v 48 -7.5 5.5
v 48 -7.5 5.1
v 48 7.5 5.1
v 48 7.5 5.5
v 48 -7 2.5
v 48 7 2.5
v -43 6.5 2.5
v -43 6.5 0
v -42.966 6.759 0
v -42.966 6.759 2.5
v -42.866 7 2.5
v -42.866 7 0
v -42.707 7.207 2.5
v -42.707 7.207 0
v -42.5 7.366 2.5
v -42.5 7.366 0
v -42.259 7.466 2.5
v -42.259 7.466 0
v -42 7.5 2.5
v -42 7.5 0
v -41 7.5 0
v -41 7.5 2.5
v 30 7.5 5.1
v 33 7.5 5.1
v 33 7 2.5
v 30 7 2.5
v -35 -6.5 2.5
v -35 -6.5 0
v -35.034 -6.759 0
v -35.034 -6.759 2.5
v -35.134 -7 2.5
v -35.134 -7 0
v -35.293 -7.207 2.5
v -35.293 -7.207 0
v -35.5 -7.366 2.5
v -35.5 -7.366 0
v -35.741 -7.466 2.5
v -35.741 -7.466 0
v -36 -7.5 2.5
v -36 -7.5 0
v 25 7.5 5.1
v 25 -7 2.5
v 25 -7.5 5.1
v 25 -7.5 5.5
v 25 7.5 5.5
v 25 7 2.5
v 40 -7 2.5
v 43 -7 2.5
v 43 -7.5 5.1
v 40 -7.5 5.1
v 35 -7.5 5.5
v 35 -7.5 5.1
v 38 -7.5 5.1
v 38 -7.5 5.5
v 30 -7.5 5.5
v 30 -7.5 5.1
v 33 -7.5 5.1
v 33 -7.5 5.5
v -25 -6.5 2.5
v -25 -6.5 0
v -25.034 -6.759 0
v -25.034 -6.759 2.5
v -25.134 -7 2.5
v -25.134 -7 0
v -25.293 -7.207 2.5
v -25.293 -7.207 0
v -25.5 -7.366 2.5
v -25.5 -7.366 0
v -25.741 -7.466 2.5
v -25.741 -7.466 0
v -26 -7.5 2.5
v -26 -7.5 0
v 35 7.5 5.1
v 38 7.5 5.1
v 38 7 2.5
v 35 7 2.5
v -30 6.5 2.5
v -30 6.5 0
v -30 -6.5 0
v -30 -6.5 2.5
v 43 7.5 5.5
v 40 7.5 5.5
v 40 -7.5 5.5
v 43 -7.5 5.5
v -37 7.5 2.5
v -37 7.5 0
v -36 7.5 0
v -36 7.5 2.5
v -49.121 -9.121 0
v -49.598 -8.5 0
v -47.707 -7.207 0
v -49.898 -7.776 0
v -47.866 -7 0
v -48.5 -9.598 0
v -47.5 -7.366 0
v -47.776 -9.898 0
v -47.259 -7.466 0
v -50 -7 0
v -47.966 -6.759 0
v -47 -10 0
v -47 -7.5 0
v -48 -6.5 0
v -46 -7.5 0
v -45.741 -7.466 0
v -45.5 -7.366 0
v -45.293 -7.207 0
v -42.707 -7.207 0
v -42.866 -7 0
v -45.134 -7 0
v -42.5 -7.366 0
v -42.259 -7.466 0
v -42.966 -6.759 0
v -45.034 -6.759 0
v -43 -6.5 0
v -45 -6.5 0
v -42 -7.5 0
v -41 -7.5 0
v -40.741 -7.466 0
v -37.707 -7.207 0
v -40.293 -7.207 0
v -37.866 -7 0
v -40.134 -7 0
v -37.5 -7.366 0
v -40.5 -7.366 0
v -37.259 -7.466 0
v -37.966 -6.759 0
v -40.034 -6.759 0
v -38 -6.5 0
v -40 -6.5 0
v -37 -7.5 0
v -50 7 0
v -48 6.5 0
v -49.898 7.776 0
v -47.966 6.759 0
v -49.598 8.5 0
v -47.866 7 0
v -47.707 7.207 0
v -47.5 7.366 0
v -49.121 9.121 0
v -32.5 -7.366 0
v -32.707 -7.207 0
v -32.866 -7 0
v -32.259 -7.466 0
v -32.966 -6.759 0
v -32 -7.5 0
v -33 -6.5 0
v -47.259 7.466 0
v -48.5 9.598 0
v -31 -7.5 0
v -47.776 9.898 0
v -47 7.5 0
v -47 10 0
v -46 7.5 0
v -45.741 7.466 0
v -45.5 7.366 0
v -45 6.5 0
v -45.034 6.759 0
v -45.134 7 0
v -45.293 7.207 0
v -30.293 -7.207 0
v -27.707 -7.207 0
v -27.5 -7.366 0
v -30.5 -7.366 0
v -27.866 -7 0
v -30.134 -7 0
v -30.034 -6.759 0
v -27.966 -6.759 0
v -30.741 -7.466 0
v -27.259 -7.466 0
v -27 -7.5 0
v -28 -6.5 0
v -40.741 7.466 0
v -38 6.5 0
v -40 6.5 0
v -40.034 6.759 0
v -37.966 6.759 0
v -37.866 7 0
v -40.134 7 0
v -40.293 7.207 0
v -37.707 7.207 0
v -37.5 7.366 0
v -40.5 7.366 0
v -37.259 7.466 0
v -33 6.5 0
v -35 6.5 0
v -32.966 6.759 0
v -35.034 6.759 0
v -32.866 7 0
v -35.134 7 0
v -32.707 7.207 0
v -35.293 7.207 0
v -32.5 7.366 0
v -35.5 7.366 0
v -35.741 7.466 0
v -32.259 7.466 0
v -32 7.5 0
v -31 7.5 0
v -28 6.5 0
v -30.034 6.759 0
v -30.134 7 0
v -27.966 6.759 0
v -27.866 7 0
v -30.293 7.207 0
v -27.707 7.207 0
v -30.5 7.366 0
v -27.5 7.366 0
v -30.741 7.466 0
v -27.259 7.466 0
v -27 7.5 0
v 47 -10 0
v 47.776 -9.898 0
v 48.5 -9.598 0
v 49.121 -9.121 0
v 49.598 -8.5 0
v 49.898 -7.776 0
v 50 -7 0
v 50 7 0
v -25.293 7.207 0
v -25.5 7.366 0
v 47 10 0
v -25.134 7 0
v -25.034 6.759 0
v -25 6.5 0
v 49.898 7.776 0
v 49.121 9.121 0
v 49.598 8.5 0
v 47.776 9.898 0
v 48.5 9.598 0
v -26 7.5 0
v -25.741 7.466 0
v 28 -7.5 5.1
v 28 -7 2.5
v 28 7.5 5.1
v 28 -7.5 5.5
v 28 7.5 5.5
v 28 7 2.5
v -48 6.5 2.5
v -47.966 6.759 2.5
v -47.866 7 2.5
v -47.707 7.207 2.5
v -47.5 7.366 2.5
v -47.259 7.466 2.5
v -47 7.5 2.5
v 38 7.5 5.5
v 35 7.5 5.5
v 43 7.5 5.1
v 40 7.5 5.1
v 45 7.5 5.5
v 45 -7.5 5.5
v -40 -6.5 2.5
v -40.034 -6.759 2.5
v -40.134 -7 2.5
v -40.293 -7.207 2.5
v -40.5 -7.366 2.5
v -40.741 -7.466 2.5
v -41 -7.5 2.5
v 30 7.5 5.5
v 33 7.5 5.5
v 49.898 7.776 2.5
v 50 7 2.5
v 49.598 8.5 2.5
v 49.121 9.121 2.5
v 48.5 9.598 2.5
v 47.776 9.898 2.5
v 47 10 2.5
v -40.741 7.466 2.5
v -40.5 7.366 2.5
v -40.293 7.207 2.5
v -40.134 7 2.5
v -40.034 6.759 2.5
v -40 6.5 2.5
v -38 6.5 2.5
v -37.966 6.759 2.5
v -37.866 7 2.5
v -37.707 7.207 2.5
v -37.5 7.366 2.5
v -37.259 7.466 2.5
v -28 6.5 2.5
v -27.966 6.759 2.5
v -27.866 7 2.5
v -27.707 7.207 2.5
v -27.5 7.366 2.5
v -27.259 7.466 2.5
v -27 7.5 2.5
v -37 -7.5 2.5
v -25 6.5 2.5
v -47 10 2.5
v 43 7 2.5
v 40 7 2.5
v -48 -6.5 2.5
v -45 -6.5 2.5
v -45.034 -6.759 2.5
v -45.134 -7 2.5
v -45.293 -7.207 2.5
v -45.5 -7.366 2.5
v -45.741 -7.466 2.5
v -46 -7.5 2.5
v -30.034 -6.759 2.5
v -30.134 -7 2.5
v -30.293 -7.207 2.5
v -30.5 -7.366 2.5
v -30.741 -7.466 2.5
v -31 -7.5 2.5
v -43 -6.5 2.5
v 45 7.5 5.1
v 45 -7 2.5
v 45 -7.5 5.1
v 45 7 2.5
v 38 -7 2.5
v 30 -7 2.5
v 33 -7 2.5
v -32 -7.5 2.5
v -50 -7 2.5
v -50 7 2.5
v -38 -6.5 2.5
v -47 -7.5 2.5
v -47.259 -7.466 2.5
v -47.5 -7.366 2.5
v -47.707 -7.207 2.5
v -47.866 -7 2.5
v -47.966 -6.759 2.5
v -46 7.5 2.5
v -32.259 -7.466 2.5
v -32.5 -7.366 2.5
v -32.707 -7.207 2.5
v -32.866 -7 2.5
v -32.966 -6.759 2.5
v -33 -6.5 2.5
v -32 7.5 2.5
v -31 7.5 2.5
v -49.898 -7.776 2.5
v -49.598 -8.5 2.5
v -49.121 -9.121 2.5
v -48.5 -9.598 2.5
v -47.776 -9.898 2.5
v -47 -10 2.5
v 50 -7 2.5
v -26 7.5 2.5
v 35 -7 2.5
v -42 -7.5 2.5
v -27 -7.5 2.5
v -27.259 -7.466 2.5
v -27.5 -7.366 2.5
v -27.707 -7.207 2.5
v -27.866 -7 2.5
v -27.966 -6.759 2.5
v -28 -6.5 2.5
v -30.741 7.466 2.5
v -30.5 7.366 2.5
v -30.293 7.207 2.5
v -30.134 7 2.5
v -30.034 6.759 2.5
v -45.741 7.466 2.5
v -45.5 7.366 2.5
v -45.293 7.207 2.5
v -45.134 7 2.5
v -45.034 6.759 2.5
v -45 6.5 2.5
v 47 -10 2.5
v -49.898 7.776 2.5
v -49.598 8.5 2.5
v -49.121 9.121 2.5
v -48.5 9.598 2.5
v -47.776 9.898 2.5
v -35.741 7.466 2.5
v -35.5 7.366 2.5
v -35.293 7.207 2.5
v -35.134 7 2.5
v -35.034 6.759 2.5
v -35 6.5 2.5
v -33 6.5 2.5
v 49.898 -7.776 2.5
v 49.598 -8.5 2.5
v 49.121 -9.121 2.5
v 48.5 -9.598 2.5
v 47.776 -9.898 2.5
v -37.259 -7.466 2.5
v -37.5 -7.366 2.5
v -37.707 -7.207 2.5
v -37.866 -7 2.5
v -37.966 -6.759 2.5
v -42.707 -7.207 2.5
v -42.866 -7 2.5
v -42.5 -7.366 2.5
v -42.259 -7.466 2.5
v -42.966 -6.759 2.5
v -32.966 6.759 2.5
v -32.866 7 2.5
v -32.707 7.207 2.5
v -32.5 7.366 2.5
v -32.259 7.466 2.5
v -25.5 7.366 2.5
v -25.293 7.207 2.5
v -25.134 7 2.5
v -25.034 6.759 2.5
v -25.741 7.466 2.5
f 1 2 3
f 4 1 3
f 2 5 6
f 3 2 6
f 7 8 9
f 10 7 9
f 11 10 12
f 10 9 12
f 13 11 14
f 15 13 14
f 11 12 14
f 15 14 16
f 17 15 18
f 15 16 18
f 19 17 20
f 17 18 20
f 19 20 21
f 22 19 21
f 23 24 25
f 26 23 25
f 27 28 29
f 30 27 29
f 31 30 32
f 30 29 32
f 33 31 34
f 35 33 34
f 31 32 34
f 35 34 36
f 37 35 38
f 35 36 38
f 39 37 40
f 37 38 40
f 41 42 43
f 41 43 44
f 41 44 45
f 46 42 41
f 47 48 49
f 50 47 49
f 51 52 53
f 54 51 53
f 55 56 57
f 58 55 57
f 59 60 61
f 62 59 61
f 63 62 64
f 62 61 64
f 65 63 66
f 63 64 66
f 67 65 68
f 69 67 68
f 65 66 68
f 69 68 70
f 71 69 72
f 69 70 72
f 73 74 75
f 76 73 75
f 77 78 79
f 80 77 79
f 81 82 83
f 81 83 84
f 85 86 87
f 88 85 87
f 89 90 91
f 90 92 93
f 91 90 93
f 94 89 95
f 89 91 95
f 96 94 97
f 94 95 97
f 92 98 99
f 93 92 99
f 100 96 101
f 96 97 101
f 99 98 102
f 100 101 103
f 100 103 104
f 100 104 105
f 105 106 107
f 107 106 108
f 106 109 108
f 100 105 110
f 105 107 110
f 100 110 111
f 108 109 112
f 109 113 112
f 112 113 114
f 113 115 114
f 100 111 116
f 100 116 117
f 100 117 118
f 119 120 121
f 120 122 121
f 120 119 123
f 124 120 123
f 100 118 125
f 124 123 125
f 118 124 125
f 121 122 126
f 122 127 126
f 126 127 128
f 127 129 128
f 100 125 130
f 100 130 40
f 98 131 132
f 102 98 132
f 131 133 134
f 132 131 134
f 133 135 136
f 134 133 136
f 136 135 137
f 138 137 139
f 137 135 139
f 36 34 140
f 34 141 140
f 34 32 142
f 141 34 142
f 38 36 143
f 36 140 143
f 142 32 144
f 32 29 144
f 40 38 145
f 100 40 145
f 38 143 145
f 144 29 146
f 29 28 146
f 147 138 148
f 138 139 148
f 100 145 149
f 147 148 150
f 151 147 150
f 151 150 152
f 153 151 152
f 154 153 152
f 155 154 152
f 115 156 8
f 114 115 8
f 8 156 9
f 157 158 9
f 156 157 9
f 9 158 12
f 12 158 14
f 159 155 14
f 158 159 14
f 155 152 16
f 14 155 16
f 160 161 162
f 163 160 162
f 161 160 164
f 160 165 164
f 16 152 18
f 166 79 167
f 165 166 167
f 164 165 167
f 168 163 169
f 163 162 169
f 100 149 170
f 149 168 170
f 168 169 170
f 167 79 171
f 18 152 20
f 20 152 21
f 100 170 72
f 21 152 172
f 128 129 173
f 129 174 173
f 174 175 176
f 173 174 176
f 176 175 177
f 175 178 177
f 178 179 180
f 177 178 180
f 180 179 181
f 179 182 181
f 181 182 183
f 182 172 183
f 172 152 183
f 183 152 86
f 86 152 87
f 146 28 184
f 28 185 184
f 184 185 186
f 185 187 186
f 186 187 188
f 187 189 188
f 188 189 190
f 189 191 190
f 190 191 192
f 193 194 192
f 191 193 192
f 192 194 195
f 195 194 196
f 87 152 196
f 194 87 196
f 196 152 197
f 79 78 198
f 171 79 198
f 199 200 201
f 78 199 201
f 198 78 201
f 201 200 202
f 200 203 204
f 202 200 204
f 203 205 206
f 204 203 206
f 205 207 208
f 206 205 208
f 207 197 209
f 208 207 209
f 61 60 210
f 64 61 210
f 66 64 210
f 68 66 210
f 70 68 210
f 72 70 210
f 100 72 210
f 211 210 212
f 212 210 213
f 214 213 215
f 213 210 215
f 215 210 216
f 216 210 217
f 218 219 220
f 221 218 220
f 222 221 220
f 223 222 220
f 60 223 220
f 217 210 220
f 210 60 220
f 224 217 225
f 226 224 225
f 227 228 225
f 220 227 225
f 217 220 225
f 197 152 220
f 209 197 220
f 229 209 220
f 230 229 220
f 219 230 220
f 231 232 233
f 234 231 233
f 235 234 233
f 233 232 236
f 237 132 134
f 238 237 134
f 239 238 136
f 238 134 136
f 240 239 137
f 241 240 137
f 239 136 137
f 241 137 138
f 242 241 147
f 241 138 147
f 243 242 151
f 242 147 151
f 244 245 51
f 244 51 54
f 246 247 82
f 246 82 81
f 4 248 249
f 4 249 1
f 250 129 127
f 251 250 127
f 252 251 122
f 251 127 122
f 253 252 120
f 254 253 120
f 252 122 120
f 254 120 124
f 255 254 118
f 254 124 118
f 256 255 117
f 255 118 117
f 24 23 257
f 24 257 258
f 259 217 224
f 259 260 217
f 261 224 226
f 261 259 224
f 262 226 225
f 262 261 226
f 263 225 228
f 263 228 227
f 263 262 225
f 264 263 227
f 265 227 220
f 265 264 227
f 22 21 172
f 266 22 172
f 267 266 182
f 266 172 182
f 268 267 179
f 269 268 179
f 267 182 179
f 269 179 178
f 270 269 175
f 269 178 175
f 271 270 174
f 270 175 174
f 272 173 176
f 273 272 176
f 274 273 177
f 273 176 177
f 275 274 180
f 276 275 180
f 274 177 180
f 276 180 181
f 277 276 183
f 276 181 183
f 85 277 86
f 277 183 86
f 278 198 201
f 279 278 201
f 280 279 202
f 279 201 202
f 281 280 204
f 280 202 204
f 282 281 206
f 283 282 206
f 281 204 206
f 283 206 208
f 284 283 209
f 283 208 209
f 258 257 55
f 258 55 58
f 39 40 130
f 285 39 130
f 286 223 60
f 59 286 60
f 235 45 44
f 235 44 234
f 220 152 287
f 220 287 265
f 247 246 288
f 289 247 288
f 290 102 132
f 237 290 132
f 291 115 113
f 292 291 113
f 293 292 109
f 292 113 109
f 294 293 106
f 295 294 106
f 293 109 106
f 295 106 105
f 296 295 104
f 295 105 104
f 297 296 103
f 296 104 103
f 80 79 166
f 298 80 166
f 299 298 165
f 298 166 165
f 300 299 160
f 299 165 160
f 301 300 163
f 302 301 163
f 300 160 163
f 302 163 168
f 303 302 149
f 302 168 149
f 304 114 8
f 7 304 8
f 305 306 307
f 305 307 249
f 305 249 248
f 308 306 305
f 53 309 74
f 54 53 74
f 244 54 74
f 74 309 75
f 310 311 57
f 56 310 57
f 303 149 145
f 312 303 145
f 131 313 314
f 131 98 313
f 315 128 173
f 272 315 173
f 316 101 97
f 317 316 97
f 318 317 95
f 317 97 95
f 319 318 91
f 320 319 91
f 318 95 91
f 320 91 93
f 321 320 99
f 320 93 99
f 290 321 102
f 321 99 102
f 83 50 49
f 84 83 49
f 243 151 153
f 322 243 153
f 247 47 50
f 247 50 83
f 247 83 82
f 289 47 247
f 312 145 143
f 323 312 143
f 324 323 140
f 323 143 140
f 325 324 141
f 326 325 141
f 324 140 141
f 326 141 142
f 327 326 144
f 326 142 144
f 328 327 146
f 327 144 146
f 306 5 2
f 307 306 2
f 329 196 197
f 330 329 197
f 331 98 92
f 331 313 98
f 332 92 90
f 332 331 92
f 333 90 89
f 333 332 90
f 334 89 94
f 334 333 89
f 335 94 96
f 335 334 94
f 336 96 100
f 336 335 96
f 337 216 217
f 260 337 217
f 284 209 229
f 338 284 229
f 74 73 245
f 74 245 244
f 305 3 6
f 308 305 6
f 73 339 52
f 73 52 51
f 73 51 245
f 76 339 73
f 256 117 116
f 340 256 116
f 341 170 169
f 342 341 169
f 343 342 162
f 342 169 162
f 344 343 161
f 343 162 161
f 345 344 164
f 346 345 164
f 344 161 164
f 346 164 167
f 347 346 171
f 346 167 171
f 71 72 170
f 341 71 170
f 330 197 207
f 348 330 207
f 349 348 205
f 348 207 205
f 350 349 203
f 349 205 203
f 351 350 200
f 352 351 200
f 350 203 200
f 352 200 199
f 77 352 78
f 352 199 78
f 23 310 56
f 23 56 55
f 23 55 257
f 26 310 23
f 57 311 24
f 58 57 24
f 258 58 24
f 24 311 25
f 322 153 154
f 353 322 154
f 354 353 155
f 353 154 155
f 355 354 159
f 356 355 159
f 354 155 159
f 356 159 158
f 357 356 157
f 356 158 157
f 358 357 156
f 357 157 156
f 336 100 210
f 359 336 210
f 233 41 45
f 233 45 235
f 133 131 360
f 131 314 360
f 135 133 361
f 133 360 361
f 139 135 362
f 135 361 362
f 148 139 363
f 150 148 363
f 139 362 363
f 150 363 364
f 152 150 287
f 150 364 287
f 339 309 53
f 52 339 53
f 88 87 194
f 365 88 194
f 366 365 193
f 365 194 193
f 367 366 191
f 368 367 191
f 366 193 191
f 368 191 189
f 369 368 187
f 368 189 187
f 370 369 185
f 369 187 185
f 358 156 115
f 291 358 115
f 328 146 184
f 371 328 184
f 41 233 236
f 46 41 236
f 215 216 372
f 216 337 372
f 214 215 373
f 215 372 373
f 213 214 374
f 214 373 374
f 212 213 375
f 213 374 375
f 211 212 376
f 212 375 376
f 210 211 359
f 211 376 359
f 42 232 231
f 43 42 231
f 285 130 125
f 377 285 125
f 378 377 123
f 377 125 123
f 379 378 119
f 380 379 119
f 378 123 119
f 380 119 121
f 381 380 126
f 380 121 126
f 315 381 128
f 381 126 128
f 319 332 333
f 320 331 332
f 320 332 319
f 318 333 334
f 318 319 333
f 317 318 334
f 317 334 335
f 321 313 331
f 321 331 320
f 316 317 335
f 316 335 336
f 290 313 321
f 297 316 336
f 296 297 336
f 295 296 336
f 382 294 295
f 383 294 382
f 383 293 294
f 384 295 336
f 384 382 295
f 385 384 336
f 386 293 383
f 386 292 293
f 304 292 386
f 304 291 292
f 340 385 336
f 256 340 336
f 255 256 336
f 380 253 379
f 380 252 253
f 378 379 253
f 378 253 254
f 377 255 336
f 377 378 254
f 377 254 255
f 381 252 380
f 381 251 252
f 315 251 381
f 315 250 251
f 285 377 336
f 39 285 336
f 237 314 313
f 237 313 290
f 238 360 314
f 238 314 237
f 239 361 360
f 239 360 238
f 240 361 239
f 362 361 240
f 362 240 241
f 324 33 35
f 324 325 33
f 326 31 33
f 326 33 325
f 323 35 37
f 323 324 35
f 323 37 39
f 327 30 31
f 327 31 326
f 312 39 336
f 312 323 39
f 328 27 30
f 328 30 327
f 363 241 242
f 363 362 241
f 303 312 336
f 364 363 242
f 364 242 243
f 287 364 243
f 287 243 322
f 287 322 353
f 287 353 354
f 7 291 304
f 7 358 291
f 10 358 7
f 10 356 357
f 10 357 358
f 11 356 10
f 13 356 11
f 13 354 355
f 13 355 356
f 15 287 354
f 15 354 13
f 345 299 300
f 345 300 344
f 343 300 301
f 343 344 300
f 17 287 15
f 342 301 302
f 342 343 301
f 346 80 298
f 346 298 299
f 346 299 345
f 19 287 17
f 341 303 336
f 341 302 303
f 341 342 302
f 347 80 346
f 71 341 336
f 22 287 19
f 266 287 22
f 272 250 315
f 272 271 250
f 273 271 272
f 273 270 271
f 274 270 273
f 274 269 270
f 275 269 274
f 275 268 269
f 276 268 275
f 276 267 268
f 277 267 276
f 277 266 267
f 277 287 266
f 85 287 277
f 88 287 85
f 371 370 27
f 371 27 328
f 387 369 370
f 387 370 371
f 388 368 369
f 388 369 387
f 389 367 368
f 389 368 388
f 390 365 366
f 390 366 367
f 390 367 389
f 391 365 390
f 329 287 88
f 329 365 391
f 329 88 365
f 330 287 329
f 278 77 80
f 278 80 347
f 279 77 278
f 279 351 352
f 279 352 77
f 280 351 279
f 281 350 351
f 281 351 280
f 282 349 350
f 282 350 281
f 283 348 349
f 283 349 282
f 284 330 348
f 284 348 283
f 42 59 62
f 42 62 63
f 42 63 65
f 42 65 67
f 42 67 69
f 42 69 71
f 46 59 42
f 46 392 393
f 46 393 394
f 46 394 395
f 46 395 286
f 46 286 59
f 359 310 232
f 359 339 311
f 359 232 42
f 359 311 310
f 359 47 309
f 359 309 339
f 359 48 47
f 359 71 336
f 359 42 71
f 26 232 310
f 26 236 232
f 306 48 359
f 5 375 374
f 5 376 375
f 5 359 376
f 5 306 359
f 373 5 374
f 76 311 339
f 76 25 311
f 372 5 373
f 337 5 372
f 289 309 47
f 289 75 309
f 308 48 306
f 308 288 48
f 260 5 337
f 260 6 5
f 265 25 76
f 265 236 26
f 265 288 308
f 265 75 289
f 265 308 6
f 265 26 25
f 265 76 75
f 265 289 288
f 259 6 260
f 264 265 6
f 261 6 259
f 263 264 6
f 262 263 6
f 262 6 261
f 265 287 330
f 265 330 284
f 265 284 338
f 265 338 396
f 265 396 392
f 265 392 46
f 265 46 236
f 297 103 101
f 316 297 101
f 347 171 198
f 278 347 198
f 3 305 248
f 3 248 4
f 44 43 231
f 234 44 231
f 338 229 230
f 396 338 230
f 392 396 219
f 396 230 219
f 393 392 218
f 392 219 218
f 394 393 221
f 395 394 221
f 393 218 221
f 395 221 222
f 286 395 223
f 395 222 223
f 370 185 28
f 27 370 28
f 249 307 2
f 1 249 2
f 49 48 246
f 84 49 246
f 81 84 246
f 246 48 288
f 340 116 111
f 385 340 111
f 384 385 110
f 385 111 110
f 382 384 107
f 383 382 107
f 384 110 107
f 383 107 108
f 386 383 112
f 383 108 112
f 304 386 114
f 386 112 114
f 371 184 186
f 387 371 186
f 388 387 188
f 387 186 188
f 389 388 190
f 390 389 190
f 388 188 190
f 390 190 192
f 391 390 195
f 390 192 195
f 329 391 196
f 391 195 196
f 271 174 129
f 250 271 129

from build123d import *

# Parameters (mm, degrees)
F0_W     = 100
F0_H     = 20
F0_W_2   = 3
F0_H_2   = 15
F1_DEPTH = 2.5
F2_W     = 3
F2_H     = 15
F3_DEPTH = 3
F5_DEPTH = 98.001
F6_R     = 3


# Not quite as in the source:
# - a feature names something its author has since deleted; it is built from what else it names


with BuildPart() as f1:
    # F0 (on Top) → F1 (new body)
    with BuildSketch(Plane.XY):
        Rectangle(F0_W, F0_H)
        with BuildLine():
            ThreePointArc((-45, -6.5), (-45.2928932188, -7.2071067812), (-46, -7.5))
            Line((-46, -7.5), (-47, -7.5))
            ThreePointArc((-47, -7.5), (-47.7071067812, -7.2071067812), (-48, -6.5))
            Line((-48, -6.5), (-48, 6.5))
            ThreePointArc((-48, 6.5), (-47.7071067812, 7.2071067812), (-47, 7.5))
            Line((-47, 7.5), (-46, 7.5))
            ThreePointArc((-46, 7.5), (-45.2928932188, 7.2071067812), (-45, 6.5))
            Line((-45, 6.5), (-45, -6.5))
        make_face(mode=Mode.SUBTRACT)
        with BuildLine():
            Line((-42, 7.5), (-41, 7.5))
            ThreePointArc((-41, 7.5), (-40.2928932188, 7.2071067812), (-40, 6.5))
            Line((-40, 6.5), (-40, -6.5))
            ThreePointArc((-40, -6.5), (-40.2928932188, -7.2071067812), (-41, -7.5))
            Line((-41, -7.5), (-42, -7.5))
            ThreePointArc((-42, -7.5), (-42.7071067812, -7.2071067812), (-43, -6.5))
            Line((-43, -6.5), (-43, 6.5))
            ThreePointArc((-43, 6.5), (-42.7071067812, 7.2071067812), (-42, 7.5))
        make_face(mode=Mode.SUBTRACT)
        with BuildLine():
            Line((-37, 7.5), (-36, 7.5))
            ThreePointArc((-36, 7.5), (-35.2928932188, 7.2071067812), (-35, 6.5))
            Line((-35, 6.5), (-35, -6.5))
            ThreePointArc((-35, -6.5), (-35.2928932188, -7.2071067812), (-36, -7.5))
            Line((-36, -7.5), (-37, -7.5))
            ThreePointArc((-37, -7.5), (-37.7071067812, -7.2071067812), (-38, -6.5))
            Line((-38, -6.5), (-38, 6.5))
            ThreePointArc((-38, 6.5), (-37.7071067812, 7.2071067812), (-37, 7.5))
        make_face(mode=Mode.SUBTRACT)
        with BuildLine():
            Line((-32, 7.5), (-31, 7.5))
            ThreePointArc((-31, 7.5), (-30.2928932188, 7.2071067812), (-30, 6.5))
            Line((-30, 6.5), (-30, -6.5))
            ThreePointArc((-30, -6.5), (-30.2928932188, -7.2071067812), (-31, -7.5))
            Line((-31, -7.5), (-32, -7.5))
            ThreePointArc((-32, -7.5), (-32.7071067812, -7.2071067812), (-33, -6.5))
            Line((-33, -6.5), (-33, 6.5))
            ThreePointArc((-33, 6.5), (-32.7071067812, 7.2071067812), (-32, 7.5))
        make_face(mode=Mode.SUBTRACT)
        with BuildLine():
            Line((-27, 7.5), (-26, 7.5))
            ThreePointArc((-26, 7.5), (-25.2928932188, 7.2071067812), (-25, 6.5))
            Line((-25, 6.5), (-25, -6.5))
            ThreePointArc((-25, -6.5), (-25.2928932188, -7.2071067812), (-26, -7.5))
            Line((-26, -7.5), (-27, -7.5))
            ThreePointArc((-27, -7.5), (-27.7071067812, -7.2071067812), (-28, -6.5))
            Line((-28, -6.5), (-28, 6.5))
            ThreePointArc((-28, 6.5), (-27.7071067812, 7.2071067812), (-27, 7.5))
        make_face(mode=Mode.SUBTRACT)
        with Locations((26.5, 0)):
            Rectangle(F0_W_2, F0_H_2, mode=Mode.SUBTRACT)
        with Locations((31.5, 0)):
            Rectangle(F0_W_2, F0_H_2, mode=Mode.SUBTRACT)
        with Locations((36.5, 0)):
            Rectangle(F0_W_2, F0_H_2, mode=Mode.SUBTRACT)
        with Locations((41.5, 0)):
            Rectangle(F0_W_2, F0_H_2, mode=Mode.SUBTRACT)
        with Locations((46.5, 0)):
            Rectangle(F0_W_2, F0_H_2, mode=Mode.SUBTRACT)
        with Locations((26.5, 0)):
            Rectangle(F0_W_2, F0_H_2)
        with Locations((31.5, 0)):
            Rectangle(F0_W_2, F0_H_2)
        with Locations((36.5, 0)):
            Rectangle(F0_W_2, F0_H_2)
        with Locations((41.5, 0)):
            Rectangle(F0_W_2, F0_H_2)
        with Locations((46.5, 0)):
            Rectangle(F0_W_2, F0_H_2)
    extrude(amount=F1_DEPTH)

    # F2 (on face) → F3 (join)
    with BuildSketch(Plane.XY.offset(2.5)):
        with Locations((26.5, 0)):
            Rectangle(F2_W, F2_H)
        with Locations((31.5, 0)):
            Rectangle(F2_W, F2_H)
        with Locations((36.5, 0)):
            Rectangle(F2_W, F2_H)
        with Locations((41.5, 0)):
            Rectangle(F2_W, F2_H)
        with Locations((46.5, 0)):
            Rectangle(F2_W, F2_H)
    extrude(amount=F3_DEPTH)

    # F4 (on face) → F5 (cut, through all)
    with BuildSketch(Plane.YZ.offset(48)):
        Polygon((-7.5, 5.1), (-7.5, 2.5), (-7, 2.5), align=None)
        Polygon((7.5, 5.1), (7, 2.5), (7.5, 2.5), align=None)
    extrude(amount=-F5_DEPTH, mode=Mode.SUBTRACT)

    # F6
    f6_edges = [f1.edges().sort_by_distance(p)[0] for p in [
        (-50, -10, 1.25),
        (50, -10, 1.25),
        (-50, 10, 1.25),
        (50, 10, 1.25),
    ]]
    fillet(f6_edges, radius=F6_R)


solid = f1.part
